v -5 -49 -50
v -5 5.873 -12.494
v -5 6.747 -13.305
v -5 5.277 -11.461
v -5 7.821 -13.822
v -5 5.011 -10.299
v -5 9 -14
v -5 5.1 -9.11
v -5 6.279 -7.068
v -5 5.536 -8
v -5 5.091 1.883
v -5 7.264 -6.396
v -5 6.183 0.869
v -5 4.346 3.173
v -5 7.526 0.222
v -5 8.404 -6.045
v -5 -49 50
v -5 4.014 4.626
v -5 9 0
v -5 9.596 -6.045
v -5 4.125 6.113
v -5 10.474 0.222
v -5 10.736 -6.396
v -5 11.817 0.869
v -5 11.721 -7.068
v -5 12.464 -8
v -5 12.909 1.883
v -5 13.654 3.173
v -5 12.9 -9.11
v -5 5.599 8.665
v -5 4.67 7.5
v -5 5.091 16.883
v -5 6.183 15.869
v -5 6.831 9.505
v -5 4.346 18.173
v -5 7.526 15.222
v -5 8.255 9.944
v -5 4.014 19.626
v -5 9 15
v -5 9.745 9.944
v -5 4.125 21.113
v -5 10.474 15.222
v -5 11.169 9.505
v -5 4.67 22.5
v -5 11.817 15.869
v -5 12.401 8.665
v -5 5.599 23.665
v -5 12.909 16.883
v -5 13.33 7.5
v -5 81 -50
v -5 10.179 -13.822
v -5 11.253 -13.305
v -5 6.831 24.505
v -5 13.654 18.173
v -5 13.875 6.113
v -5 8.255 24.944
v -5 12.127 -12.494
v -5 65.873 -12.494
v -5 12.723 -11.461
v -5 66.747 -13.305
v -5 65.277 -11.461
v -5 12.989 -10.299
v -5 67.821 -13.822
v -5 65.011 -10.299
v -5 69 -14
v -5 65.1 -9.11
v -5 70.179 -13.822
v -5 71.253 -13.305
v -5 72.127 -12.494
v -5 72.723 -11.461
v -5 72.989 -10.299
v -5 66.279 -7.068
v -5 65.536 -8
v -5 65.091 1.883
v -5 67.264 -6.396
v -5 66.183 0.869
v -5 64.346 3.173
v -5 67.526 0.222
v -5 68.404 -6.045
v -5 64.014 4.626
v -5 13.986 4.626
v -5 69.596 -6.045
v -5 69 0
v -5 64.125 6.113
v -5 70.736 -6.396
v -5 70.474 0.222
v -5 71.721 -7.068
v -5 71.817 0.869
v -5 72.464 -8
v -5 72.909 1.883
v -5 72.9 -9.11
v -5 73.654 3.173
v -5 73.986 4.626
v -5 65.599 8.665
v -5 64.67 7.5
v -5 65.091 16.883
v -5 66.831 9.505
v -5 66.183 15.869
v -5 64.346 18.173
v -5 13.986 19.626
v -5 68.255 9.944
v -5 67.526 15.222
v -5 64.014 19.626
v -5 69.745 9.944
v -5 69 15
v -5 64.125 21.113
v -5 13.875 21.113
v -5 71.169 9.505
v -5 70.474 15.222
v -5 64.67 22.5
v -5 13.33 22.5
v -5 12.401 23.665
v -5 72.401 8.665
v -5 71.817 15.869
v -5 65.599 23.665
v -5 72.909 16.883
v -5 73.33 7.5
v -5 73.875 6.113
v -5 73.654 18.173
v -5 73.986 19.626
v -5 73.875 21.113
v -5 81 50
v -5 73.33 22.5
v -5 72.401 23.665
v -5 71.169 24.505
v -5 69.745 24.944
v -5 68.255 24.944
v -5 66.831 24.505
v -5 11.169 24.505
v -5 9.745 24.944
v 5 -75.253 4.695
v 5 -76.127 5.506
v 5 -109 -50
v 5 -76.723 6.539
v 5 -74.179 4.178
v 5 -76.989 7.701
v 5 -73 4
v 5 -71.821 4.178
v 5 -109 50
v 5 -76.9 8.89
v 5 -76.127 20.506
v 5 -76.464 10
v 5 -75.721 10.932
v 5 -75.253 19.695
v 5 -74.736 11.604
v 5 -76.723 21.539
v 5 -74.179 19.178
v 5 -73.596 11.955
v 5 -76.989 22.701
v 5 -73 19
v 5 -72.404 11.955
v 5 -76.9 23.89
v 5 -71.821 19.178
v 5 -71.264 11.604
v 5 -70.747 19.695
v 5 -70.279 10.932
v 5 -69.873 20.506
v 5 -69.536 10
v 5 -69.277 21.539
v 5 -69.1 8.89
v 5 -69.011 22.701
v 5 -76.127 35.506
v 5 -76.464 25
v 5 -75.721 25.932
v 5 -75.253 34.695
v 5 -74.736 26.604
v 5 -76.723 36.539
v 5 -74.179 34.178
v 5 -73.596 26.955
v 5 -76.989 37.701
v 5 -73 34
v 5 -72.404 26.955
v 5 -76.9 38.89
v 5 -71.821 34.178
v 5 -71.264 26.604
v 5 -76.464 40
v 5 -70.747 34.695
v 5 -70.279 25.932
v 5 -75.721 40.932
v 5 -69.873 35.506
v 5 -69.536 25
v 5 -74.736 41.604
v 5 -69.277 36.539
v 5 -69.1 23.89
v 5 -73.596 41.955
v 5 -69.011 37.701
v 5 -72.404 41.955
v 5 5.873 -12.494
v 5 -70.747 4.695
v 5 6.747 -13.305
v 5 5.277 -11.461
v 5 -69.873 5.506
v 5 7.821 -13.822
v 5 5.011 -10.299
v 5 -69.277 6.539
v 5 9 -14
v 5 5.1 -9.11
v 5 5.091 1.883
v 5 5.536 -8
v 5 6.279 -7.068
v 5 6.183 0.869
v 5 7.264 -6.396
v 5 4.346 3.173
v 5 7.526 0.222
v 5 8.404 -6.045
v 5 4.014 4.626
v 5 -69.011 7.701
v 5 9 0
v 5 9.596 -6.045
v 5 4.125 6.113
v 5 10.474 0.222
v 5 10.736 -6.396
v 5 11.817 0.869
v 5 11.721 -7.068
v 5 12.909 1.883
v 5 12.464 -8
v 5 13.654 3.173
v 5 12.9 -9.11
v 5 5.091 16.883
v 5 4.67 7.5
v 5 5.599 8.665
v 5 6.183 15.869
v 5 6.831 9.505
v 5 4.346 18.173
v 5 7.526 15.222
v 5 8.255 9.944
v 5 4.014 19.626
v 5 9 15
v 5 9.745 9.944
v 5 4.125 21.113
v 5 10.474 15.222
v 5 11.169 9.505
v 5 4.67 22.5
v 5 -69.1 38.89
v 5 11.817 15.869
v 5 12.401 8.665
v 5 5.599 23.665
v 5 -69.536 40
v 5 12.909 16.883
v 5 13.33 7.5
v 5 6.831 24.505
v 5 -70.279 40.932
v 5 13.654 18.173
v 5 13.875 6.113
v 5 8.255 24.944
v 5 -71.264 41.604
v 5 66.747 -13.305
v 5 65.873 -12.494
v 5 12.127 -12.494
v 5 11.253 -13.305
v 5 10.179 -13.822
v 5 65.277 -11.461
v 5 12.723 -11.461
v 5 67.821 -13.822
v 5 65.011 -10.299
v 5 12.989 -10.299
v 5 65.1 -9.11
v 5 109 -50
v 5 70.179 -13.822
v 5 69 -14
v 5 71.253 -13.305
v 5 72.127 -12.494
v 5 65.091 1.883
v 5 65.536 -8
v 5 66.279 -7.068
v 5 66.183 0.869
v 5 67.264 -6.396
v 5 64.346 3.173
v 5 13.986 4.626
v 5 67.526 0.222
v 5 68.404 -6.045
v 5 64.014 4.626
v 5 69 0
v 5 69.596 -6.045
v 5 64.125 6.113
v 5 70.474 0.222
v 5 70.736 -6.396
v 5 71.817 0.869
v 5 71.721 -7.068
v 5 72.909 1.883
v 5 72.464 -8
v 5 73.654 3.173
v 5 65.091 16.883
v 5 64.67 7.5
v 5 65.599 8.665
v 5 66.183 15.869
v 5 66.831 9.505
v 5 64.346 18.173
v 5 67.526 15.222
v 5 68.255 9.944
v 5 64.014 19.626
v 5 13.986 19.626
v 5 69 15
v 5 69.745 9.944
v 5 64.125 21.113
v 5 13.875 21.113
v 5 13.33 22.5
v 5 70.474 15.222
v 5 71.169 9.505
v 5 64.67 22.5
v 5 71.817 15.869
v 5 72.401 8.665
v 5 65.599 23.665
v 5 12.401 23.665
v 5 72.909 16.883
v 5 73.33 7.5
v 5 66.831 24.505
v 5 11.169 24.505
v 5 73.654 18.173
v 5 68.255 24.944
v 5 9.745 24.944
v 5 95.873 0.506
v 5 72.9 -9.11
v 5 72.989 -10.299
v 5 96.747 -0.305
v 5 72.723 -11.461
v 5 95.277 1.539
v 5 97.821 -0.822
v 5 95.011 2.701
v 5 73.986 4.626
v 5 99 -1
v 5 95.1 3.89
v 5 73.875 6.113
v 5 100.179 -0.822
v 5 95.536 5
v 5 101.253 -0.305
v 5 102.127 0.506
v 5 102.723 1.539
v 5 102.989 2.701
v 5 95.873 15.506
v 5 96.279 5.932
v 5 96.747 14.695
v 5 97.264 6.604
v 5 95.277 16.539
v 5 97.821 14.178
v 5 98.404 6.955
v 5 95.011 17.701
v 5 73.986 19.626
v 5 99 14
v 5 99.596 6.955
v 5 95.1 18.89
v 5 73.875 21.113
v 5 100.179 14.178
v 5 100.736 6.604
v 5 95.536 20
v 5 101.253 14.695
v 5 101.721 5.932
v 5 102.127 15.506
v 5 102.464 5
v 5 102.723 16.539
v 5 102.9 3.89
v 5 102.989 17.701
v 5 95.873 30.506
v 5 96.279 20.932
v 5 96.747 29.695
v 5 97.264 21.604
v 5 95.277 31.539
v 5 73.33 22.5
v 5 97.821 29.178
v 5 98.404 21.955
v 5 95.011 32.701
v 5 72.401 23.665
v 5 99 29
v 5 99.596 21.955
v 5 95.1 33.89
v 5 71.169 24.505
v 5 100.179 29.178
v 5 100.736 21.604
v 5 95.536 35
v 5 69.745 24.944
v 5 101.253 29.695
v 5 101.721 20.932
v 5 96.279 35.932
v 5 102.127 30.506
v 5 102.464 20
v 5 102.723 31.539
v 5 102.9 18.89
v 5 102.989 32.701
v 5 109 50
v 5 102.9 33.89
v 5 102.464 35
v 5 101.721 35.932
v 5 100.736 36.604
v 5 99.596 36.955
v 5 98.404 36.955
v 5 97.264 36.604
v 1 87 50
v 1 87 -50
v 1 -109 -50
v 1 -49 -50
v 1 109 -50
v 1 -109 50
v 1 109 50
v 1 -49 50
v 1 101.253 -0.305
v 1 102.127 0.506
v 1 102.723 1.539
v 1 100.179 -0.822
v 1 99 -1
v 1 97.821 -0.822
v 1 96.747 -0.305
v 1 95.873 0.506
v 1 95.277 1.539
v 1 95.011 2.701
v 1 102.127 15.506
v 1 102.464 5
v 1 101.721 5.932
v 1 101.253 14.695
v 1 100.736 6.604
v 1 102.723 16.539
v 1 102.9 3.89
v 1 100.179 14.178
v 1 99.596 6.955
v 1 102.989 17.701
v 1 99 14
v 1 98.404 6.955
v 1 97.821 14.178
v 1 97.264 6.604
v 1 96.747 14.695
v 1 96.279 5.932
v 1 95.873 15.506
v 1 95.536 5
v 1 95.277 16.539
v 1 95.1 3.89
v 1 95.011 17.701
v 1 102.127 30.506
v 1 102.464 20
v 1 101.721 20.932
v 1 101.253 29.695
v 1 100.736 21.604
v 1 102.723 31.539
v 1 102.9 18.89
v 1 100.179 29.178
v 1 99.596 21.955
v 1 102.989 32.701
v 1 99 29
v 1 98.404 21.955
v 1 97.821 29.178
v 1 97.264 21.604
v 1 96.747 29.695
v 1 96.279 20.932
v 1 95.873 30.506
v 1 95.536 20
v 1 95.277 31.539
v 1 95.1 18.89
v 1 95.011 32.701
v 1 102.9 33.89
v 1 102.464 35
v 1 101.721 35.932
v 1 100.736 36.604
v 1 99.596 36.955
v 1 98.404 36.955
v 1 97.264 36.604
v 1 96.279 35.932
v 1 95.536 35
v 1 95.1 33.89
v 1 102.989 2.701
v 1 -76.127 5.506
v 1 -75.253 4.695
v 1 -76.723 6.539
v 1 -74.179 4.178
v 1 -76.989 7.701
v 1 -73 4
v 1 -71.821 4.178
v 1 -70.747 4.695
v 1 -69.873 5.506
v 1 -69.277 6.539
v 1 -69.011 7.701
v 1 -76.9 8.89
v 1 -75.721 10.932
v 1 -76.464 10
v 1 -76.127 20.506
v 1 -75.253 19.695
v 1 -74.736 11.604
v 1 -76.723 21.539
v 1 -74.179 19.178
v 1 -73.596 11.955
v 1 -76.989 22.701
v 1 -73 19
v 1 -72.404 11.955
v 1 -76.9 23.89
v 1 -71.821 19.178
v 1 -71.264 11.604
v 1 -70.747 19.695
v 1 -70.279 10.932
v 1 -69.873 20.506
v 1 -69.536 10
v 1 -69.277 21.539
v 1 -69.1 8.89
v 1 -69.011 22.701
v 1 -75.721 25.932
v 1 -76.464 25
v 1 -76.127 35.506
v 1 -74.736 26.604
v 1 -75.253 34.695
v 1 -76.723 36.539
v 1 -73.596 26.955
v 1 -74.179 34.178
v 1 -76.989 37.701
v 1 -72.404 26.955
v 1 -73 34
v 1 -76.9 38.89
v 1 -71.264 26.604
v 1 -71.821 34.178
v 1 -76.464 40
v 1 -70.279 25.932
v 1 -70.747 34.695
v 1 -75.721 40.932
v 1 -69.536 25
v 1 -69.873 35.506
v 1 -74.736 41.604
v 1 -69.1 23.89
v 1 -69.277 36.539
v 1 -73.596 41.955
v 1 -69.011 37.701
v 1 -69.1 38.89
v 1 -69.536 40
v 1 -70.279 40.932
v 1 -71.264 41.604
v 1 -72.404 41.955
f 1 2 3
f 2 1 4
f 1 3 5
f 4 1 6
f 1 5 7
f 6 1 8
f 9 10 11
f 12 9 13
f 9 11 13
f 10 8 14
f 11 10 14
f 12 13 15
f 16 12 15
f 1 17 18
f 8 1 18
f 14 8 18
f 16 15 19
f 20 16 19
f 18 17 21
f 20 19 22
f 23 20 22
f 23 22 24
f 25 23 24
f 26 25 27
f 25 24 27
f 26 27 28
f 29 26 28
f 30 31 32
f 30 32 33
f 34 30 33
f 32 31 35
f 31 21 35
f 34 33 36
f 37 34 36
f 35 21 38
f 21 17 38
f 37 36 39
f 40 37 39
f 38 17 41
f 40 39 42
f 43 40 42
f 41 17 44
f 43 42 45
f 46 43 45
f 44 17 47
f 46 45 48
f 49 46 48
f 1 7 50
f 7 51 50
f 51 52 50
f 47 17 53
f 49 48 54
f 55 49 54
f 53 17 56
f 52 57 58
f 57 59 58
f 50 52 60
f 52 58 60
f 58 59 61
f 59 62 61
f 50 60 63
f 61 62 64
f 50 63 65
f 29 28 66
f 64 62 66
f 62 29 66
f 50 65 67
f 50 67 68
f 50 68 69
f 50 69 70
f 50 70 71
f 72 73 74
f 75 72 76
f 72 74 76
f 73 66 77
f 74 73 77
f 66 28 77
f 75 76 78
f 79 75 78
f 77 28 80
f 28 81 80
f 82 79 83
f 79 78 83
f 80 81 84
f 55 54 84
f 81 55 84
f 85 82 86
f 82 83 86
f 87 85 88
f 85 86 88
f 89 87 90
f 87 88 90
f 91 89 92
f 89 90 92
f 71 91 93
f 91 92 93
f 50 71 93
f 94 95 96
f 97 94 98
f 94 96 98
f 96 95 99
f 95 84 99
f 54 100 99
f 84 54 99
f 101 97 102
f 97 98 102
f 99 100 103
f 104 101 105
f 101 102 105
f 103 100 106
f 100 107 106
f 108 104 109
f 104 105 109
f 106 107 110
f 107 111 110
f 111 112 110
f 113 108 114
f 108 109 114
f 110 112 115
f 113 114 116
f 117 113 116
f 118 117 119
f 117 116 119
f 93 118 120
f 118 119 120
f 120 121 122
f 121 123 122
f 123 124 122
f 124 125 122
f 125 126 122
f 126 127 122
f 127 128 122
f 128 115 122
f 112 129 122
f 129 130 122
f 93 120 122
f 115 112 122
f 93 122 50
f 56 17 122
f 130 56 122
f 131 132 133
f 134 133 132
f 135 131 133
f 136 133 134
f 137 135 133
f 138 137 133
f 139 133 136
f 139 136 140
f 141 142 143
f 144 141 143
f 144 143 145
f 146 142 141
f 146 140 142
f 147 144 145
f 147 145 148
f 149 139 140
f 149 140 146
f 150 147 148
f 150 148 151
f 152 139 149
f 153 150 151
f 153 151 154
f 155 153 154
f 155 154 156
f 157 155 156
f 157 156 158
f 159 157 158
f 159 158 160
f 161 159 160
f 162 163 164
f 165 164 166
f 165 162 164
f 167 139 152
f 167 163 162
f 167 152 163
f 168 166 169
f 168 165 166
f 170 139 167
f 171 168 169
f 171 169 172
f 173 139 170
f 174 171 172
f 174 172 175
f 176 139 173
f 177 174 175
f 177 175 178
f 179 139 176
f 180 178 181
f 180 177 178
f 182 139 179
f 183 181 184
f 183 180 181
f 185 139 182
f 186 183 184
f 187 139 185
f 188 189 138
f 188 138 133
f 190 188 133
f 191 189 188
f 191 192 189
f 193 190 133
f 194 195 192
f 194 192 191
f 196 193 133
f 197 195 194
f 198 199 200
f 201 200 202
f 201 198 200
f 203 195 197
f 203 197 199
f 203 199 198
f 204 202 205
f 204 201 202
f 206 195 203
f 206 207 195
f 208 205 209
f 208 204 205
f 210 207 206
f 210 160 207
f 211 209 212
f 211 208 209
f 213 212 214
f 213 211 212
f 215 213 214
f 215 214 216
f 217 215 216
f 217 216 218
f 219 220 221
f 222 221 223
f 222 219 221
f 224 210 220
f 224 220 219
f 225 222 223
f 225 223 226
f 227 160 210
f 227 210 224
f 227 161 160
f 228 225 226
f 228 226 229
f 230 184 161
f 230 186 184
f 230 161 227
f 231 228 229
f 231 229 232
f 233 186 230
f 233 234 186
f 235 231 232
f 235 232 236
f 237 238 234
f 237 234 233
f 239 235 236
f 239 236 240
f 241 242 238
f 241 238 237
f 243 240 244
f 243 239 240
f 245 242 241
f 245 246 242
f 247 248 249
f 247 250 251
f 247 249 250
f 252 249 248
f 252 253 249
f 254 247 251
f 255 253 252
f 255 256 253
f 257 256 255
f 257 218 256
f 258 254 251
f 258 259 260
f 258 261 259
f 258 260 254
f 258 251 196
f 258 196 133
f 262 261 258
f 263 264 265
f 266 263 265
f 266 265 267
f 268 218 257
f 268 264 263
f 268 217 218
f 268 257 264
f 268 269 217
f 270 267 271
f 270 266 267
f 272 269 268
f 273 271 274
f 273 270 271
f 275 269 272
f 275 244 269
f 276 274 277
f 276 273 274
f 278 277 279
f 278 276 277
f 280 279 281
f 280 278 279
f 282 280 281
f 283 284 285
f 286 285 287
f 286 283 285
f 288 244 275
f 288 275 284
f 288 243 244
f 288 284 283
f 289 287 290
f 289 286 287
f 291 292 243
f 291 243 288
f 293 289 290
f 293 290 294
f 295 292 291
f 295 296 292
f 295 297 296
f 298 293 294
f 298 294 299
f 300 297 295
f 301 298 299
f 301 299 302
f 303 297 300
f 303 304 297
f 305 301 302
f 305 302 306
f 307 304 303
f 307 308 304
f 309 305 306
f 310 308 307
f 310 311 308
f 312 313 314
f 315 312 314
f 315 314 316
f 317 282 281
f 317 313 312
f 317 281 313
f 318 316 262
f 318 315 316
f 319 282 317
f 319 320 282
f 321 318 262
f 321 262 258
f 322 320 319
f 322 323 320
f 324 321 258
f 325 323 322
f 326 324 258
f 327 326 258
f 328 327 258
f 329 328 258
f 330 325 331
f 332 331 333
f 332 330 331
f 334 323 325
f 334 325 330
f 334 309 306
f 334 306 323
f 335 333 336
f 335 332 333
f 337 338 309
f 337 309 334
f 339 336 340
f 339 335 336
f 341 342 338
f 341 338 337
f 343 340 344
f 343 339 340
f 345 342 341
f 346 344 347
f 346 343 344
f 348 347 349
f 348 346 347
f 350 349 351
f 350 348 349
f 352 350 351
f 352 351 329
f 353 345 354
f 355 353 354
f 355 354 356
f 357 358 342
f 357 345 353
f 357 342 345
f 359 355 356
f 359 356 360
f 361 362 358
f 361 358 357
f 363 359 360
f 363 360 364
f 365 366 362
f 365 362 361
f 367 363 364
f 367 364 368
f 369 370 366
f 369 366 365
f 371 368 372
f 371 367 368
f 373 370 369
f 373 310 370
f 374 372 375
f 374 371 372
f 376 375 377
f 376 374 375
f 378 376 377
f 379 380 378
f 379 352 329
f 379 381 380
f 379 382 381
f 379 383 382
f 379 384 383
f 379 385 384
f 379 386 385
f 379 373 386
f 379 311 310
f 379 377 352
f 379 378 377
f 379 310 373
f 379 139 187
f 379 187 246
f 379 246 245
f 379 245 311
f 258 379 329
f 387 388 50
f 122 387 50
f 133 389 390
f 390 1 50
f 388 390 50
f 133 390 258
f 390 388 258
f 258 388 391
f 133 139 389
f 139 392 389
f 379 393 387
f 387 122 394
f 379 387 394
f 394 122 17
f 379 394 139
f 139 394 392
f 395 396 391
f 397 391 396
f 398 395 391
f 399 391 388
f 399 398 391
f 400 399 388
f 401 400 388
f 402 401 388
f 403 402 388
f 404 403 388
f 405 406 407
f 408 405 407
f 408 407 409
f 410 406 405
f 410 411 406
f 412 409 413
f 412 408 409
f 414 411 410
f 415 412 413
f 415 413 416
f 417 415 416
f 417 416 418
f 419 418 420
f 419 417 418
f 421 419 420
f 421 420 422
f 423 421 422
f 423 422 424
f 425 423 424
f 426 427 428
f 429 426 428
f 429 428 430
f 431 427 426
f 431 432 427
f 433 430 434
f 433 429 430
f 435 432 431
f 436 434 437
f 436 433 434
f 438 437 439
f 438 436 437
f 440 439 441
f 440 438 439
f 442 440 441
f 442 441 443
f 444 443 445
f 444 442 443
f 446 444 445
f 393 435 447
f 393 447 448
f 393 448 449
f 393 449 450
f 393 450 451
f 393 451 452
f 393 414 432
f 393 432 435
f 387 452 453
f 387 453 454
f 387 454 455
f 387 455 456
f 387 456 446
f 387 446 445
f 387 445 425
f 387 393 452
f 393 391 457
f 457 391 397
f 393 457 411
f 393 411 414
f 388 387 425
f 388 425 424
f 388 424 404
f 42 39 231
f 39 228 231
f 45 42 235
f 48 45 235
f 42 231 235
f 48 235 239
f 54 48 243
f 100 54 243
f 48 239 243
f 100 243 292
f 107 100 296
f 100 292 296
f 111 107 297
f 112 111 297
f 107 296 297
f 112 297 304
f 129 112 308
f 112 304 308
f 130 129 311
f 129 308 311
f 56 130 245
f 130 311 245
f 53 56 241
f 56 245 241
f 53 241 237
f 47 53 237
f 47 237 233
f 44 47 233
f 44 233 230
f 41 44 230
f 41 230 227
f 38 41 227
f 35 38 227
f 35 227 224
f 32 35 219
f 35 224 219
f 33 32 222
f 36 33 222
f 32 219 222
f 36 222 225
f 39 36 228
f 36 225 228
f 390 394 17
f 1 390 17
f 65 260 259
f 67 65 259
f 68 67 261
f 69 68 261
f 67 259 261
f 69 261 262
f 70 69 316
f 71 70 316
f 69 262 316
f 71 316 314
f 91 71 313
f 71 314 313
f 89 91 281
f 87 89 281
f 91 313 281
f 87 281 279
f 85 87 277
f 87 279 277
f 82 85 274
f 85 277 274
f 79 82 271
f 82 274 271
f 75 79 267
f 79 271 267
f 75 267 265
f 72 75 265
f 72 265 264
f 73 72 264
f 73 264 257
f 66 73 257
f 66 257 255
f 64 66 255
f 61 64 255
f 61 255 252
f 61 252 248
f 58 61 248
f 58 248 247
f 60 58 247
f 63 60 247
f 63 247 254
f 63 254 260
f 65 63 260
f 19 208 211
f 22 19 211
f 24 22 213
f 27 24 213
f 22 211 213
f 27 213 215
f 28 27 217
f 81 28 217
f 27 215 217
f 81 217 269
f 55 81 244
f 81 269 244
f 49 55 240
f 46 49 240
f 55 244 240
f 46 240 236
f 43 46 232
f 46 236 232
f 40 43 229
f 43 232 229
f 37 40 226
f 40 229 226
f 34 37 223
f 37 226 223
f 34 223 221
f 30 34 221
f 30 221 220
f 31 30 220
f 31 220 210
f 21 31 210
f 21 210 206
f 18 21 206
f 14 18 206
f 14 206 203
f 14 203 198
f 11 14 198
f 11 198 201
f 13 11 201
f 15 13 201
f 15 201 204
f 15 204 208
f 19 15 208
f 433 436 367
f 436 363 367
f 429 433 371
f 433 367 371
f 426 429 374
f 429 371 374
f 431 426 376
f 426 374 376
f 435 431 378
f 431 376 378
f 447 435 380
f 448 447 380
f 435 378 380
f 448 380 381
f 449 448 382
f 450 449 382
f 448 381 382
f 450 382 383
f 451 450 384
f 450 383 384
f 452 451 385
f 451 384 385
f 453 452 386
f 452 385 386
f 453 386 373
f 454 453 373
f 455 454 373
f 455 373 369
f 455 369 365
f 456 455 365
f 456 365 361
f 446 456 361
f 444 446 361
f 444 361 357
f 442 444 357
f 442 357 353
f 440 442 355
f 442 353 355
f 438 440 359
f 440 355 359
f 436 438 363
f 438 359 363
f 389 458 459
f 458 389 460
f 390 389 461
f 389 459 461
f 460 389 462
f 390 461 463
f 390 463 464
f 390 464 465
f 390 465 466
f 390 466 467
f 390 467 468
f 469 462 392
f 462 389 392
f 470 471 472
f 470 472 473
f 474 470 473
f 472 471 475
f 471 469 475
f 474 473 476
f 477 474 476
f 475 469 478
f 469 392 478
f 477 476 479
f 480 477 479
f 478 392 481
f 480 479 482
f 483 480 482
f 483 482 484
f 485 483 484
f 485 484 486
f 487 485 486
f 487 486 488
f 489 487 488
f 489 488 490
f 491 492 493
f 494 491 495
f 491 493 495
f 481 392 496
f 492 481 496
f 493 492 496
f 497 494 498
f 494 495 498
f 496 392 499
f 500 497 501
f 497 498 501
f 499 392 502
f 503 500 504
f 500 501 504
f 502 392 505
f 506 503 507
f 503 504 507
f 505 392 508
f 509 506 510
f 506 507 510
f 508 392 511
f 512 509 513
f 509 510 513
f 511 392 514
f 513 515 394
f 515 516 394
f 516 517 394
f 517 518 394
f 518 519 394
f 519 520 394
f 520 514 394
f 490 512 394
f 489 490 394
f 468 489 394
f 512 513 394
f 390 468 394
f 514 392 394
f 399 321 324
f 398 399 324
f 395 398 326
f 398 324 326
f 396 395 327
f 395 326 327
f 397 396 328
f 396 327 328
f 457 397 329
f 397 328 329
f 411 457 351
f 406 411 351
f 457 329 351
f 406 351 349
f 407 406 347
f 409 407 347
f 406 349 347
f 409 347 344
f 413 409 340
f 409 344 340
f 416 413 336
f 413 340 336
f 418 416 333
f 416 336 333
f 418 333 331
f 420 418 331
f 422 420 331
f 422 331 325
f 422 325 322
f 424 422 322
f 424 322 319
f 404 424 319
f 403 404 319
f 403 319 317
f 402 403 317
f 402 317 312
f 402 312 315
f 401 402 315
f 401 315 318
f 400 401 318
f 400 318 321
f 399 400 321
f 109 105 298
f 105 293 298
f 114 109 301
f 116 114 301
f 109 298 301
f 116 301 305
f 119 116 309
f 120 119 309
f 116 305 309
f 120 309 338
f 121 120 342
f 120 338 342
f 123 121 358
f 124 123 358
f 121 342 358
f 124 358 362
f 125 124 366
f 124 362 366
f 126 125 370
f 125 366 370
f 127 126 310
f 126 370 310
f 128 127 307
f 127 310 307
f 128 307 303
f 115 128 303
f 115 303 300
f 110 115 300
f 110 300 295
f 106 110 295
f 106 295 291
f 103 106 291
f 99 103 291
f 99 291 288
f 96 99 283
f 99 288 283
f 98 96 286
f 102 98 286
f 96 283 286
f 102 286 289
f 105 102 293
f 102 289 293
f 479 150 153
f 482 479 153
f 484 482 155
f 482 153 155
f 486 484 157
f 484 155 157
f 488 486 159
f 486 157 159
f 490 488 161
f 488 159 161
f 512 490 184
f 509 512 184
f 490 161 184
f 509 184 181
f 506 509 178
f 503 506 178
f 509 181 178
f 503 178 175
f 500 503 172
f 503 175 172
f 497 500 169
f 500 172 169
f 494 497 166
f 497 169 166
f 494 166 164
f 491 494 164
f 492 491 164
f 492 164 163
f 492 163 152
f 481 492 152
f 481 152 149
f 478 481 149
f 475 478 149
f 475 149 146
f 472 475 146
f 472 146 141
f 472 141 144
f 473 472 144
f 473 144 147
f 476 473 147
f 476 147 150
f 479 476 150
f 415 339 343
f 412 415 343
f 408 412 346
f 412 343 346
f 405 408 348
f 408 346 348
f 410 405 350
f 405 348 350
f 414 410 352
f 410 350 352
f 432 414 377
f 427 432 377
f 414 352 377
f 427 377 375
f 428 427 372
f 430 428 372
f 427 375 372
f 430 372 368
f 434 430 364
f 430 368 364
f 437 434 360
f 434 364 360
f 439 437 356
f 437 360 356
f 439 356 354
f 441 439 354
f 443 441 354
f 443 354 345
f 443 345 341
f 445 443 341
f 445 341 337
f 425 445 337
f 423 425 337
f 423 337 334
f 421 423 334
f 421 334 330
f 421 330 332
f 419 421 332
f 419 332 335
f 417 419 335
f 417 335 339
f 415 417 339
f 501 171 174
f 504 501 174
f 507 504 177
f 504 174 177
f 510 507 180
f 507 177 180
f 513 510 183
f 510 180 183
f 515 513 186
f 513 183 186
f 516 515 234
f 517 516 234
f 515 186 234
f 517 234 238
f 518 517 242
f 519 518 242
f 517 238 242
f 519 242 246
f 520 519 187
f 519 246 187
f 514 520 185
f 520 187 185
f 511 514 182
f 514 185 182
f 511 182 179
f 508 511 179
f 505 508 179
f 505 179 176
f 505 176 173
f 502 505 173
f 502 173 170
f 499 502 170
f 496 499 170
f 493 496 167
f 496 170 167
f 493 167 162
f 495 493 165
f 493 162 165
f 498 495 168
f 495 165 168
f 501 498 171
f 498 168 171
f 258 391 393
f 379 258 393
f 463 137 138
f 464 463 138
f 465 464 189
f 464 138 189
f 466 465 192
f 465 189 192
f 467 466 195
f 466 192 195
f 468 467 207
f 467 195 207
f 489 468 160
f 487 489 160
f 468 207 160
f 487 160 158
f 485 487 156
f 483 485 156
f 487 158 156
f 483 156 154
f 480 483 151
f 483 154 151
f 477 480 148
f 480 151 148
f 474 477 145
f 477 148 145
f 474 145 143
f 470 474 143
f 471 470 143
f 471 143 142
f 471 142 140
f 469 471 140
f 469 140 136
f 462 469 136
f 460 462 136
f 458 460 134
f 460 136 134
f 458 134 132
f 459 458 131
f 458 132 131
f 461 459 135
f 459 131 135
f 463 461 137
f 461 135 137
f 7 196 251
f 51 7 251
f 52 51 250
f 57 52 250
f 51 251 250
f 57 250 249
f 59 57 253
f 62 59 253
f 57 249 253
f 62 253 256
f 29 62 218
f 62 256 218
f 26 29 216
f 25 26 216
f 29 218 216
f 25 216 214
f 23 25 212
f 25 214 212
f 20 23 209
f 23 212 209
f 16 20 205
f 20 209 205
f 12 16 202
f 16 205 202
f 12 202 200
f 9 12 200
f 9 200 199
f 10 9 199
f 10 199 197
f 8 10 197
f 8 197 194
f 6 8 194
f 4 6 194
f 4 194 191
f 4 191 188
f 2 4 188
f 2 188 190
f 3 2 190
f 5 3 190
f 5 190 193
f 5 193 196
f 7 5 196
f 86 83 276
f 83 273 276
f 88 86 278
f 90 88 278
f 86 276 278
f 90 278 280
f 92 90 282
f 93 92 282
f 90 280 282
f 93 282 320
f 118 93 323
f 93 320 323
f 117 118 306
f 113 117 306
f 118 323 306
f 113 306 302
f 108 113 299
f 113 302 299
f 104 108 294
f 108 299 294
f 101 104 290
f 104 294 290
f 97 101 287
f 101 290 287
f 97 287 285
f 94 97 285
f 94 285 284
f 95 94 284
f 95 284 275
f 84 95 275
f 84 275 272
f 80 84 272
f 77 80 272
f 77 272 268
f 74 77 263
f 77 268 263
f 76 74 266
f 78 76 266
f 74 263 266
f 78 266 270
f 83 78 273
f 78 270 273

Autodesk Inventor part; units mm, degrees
ref_plane "YZ Plane" through (0, 0, 0) normal (1, 0, 0) x (0, 1, 0)
ref_plane "XZ Plane" through (0, 0, 0) normal (0, 1, 0) x (-1, 0, 0)
ref_plane "XY Plane" through (0, 0, 0) normal (0, 0, 1) x (1, 0, 0)
sketch "Sketch1" plane through (0, 0, 0) normal (1, 0, 0) x (0, 1, 0)
  line L0 (109, 50) -> (-109, 50)
  line L1 (-109, 50) -> (-109, -50)
  line L2 (-109, -50) -> (109, -50)
  line L3 (109, -50) -> (109, 50)
  line L4 (109, 50) -> (-109, -50) construction
  line L5 (-109, 50) -> (109, -50) construction
  point P0 (0, 0)
  dimension "d0" = 100
  dimension "d1" = 218
extrude "Extrusion1" add sketch "Sketch1" along normal mid plane 10
sketch "Sketch2" plane through (-5, -109, 50) normal (0, 0, 1) x (1, 0, 0)
  line L0 (0, 218) -> (10, 218) projected
  line L1 (6, 218) -> (6, 196)
  line L2 (6, 196) -> (0, 190)
  line L3 (0, 218) -> (0, 0) projected
  line L4 (6, 218) -> (0, 218)
  line L5 (0, 190) -> (0, 218)
  line L6 (0, 0) -> (10, 0) projected
  line L7 (6, 0) -> (6, 60)
  line L8 (6, 60) -> (0, 60)
  line L9 (6, 0) -> (0, 0)
  line L10 (0, 60) -> (0, 0)
  point P0 (5, 109)
  dimension "d5" = 4
  dimension "d6" = 22
  dimension "d7" = 135
  dimension "d8" = 60
  dimension "d10" = 4
extrude "Extrusion2" cut sketch "Sketch2" against normal through all
sketch "Sketch3" plane through (5, 0, 0) normal (1, 0, 0) x (0, 0, -1)
  circle A0 centre (-38, -73) radius 4
  circle A1 centre (-23, -73) radius 4
  circle A2 centre (-8, -73) radius 4
  circle A3 centre (-33, 99) radius 4
  circle A4 centre (-18, 99) radius 4
  circle A5 centre (-3, 99) radius 4
  line L0 (-50, 109) -> (-50, -109) projected
  line L1 (-33, 99) -> (-18, 99) construction
  line L2 (-18, 99) -> (-3, 99) construction
  line L3 (50, 109) -> (-50, 109) projected
  line L4 (-38, -73) -> (-23, -73) construction
  line L5 (-23, -73) -> (-8, -73) construction
  line L6 (-50, -109) -> (50, -109) projected
  circle A6 centre (-20, 69) radius 5
  circle A7 centre (-5, 69) radius 5
  circle A8 centre (10, 69) radius 4
  circle A9 centre (-20, 9) radius 5
  circle A10 centre (-5, 9) radius 5
  circle A11 centre (10, 9) radius 4
  line L7 (-20, 69) -> (10, 69) construction
  line L8 (-20, 9) -> (10, 9) construction
  line L9 (-20, 9) -> (-20, 69) construction
  point P0 (0, 0)
  dimension "d13" = 8
  dimension "d14" = 8
  dimension "d15" = 17
  dimension "d16" = 15
  dimension "d17" = 15
  dimension "d18" = 10
  dimension "d19" = 12
  dimension "d20" = 15
  dimension "d21" = 15
  dimension "d22" = 36
  dimension "d23" = 10
  dimension "d24" = 8
  dimension "d25" = 40
  dimension "d26" = 30
  dimension "d27" = 15
  dimension "d28" = 15
  dimension "d29" = 60
  dimension "d30" = 15
  dimension "d31" = 15
extrude "Extrusion3" cut sketch "Sketch3" against normal through all
properties part number "DrivenSideBallScrewSupport"
